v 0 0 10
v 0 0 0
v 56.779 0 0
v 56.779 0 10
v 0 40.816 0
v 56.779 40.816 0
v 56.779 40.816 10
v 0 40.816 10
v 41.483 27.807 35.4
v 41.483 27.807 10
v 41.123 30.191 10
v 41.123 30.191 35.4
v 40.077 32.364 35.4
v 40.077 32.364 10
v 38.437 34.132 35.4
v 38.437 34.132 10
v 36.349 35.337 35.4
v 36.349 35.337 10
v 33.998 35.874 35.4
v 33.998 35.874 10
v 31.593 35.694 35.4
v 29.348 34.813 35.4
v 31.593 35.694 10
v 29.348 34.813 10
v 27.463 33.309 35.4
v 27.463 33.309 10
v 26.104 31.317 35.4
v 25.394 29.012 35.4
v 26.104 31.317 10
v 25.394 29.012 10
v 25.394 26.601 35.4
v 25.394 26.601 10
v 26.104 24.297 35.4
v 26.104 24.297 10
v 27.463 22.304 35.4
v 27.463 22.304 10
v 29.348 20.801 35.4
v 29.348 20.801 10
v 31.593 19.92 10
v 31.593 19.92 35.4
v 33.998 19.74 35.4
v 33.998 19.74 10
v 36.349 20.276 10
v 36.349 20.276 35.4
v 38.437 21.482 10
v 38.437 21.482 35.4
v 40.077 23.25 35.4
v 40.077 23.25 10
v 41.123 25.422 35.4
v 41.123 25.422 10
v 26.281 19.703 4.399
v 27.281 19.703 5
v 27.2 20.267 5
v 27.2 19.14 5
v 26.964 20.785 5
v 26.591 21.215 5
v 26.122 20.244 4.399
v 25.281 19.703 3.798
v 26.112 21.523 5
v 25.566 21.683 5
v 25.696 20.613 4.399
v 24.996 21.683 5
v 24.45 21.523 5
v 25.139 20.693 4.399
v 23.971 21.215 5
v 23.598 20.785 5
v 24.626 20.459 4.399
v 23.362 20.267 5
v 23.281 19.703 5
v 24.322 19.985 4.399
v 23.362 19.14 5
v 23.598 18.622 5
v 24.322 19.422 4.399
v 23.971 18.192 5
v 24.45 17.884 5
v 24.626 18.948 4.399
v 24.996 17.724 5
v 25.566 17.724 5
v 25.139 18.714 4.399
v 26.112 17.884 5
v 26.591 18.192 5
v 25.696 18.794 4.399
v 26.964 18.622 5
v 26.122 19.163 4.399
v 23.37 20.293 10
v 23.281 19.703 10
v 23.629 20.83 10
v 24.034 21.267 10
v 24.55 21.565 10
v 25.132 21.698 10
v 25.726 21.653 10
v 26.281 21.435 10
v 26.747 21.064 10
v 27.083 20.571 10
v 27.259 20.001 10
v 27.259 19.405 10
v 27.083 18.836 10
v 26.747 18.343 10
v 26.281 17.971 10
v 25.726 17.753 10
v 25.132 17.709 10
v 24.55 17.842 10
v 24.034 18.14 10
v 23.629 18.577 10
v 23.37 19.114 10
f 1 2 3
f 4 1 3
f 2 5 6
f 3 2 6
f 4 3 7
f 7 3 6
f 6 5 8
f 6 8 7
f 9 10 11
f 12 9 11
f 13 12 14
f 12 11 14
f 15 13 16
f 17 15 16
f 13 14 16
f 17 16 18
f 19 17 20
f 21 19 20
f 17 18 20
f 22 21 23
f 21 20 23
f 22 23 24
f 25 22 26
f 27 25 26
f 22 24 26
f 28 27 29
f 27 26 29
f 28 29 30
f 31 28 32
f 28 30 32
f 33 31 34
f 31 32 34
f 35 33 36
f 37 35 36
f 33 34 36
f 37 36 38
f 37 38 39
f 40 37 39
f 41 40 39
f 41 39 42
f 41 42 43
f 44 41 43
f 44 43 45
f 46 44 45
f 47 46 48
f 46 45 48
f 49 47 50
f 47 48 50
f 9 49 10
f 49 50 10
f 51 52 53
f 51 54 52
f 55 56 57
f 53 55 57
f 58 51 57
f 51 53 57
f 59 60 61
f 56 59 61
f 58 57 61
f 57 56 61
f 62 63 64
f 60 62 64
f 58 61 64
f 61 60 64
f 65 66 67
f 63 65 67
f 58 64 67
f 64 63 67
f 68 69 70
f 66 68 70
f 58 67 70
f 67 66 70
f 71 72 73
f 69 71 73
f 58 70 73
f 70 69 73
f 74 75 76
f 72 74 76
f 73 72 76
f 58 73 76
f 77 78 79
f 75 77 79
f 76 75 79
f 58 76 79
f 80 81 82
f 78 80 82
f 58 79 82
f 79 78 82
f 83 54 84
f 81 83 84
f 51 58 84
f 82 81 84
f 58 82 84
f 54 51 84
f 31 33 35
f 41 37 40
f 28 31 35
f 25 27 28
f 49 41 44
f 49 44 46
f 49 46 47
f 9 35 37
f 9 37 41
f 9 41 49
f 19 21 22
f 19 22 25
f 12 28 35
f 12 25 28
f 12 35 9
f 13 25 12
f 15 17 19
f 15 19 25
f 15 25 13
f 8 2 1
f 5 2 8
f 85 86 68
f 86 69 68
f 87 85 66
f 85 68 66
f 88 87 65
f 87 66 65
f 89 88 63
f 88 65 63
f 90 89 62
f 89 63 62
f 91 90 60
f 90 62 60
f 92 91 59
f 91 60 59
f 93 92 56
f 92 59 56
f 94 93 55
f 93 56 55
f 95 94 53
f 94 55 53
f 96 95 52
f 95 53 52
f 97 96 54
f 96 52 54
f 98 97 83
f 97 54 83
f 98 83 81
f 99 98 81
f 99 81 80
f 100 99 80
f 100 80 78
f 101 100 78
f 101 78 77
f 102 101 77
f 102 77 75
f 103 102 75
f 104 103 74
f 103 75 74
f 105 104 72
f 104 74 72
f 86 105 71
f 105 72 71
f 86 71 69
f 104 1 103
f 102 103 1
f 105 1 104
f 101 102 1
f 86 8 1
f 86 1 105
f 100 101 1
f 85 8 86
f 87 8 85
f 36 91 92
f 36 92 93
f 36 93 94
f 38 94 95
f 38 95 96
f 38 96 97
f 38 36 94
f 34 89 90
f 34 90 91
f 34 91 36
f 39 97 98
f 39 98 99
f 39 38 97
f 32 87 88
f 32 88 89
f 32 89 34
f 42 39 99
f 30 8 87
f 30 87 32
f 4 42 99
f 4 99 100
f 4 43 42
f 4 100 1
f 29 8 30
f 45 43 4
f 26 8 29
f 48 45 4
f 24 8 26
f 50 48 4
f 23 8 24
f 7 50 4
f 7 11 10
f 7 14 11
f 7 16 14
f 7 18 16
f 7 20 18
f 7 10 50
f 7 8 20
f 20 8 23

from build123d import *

# Parameters (mm, degrees)
F0_W     = 56.778665632
F0_H     = 40.8155359328
F1_DEPTH = 10
F3_D     = 4
F3_DEPTH = 5
F3_TIP   = 1.2017212381
F4_R     = 8.0897194279
F5_DEPTH = 25.4


with BuildPart() as f1:
    # F0 (on Top) → F1 (new body)
    with BuildSketch(Plane.XY):
        with Locations((28.389332816, 20.4077679664)):
            Rectangle(F0_W, F0_H)
    extrude(amount=F1_DEPTH)

    # F3
    with Locations(Plane.XY.offset(10)):
        with Locations((25.281002745, 19.7033435106)):
            Hole(F3_D / 2, depth=F3_DEPTH)
            with Locations((0, 0, -(F3_DEPTH + F3_TIP / 2))):  # 118° drill point
                Cone(0, F3_D / 2, F3_TIP, mode=Mode.SUBTRACT)

    # F4 (on face) → F5 (join)
    with BuildSketch(Plane.XY.offset(10)):
        with Locations((33.39304775, 27.8067756444)):
            Circle(F4_R)
    extrude(amount=F5_DEPTH)


solid = f1.part
